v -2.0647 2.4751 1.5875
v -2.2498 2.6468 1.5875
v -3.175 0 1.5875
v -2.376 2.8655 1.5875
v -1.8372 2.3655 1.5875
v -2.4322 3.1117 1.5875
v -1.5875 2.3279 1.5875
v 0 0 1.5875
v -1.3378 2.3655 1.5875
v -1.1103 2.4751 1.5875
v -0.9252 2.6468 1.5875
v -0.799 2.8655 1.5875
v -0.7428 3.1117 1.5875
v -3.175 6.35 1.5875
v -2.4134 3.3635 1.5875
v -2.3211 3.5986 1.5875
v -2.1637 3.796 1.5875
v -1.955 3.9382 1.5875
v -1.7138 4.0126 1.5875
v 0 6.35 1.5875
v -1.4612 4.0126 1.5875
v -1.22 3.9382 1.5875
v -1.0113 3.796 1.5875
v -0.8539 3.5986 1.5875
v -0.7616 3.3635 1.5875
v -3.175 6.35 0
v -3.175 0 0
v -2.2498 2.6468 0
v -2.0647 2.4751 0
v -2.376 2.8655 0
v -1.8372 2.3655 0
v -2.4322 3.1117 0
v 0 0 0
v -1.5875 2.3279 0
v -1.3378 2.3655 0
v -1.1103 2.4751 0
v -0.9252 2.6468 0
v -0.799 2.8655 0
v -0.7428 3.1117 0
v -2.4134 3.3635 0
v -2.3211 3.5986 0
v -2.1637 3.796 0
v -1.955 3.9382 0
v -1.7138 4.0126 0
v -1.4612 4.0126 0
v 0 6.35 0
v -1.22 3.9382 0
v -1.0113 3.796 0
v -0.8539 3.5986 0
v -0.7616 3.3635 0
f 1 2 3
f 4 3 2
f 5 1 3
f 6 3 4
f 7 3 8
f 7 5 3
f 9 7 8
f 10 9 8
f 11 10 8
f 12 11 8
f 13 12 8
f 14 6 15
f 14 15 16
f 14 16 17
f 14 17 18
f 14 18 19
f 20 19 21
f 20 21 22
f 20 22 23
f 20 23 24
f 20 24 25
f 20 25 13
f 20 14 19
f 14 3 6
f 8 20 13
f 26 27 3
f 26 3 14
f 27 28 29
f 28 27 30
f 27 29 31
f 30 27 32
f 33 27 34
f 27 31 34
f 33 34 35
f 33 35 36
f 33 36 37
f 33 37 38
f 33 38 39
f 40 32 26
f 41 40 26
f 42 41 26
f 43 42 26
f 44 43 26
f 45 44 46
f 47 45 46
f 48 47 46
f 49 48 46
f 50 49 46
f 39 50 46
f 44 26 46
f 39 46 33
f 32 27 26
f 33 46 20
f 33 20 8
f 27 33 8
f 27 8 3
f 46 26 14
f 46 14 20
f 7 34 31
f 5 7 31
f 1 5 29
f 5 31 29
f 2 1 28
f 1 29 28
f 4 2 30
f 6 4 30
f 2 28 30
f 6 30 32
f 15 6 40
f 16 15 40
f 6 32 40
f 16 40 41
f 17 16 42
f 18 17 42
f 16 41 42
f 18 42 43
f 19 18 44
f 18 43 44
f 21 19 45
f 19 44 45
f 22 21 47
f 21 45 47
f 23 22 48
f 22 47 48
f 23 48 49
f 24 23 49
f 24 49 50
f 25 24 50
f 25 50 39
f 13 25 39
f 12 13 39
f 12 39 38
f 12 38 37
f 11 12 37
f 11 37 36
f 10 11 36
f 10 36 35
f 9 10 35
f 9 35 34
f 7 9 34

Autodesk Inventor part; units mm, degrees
ref_plane "YZ Plane" through (0, 0, 0) normal (1, 0, 0) x (0, 1, 0)
ref_plane "XZ Plane" through (0, 0, 0) normal (0, 1, 0) x (-1, 0, 0)
ref_plane "XY Plane" through (0, 0, 0) normal (0, 0, 1) x (1, 0, 0)
sketch "Boceto1" plane through (0, 0, 0) normal (0, 0, 1) x (1, 0, 0)
  line L0 (0, 0) -> (-3.175, 0)
  line L1 (-3.175, 0) -> (-3.175, 6.35)
  line L2 (-3.175, 6.35) -> (0, 6.35)
  line L3 (0, 6.35) -> (0, 0)
  dimension "d0" = 3.175
  dimension "d1" = 6.35
extrude "Extrusión1" add sketch "Boceto1" along normal blind 1.5875
sketch "Boceto2" plane through (0, 0, 1.5875) normal (0, 0, 1) x (1, 0, 0)
  line L0 (-3.175, 0) -> (0, 0) projected
  line L1 (0, 6.35) -> (-3.175, 6.35) projected
  line L2 (-3.175, 6.35) -> (-3.175, 0) projected
  line L3 (0, 0) -> (0, 6.35) projected
  point P0 (-1.5875, 3.175)
  dimension "d4" = 6.35
  dimension "d5" = 3.175
  dimension "d6" = 1.5875
  dimension "d7" = 3.175
hole "Agujero1" at (-1.5875, 3.175, 1.5875) direction (0, 0, -1) diameter 1.6942 end through all thread size "2-56 UNC" class "2B" standard "ANSI Unified Screw Threads"
equation "\"d6\" = 0.5 * d5"
equation "\"d7\" = 0.5 * d4"
properties part number "Nut" material "Latón, amarillo claro"
